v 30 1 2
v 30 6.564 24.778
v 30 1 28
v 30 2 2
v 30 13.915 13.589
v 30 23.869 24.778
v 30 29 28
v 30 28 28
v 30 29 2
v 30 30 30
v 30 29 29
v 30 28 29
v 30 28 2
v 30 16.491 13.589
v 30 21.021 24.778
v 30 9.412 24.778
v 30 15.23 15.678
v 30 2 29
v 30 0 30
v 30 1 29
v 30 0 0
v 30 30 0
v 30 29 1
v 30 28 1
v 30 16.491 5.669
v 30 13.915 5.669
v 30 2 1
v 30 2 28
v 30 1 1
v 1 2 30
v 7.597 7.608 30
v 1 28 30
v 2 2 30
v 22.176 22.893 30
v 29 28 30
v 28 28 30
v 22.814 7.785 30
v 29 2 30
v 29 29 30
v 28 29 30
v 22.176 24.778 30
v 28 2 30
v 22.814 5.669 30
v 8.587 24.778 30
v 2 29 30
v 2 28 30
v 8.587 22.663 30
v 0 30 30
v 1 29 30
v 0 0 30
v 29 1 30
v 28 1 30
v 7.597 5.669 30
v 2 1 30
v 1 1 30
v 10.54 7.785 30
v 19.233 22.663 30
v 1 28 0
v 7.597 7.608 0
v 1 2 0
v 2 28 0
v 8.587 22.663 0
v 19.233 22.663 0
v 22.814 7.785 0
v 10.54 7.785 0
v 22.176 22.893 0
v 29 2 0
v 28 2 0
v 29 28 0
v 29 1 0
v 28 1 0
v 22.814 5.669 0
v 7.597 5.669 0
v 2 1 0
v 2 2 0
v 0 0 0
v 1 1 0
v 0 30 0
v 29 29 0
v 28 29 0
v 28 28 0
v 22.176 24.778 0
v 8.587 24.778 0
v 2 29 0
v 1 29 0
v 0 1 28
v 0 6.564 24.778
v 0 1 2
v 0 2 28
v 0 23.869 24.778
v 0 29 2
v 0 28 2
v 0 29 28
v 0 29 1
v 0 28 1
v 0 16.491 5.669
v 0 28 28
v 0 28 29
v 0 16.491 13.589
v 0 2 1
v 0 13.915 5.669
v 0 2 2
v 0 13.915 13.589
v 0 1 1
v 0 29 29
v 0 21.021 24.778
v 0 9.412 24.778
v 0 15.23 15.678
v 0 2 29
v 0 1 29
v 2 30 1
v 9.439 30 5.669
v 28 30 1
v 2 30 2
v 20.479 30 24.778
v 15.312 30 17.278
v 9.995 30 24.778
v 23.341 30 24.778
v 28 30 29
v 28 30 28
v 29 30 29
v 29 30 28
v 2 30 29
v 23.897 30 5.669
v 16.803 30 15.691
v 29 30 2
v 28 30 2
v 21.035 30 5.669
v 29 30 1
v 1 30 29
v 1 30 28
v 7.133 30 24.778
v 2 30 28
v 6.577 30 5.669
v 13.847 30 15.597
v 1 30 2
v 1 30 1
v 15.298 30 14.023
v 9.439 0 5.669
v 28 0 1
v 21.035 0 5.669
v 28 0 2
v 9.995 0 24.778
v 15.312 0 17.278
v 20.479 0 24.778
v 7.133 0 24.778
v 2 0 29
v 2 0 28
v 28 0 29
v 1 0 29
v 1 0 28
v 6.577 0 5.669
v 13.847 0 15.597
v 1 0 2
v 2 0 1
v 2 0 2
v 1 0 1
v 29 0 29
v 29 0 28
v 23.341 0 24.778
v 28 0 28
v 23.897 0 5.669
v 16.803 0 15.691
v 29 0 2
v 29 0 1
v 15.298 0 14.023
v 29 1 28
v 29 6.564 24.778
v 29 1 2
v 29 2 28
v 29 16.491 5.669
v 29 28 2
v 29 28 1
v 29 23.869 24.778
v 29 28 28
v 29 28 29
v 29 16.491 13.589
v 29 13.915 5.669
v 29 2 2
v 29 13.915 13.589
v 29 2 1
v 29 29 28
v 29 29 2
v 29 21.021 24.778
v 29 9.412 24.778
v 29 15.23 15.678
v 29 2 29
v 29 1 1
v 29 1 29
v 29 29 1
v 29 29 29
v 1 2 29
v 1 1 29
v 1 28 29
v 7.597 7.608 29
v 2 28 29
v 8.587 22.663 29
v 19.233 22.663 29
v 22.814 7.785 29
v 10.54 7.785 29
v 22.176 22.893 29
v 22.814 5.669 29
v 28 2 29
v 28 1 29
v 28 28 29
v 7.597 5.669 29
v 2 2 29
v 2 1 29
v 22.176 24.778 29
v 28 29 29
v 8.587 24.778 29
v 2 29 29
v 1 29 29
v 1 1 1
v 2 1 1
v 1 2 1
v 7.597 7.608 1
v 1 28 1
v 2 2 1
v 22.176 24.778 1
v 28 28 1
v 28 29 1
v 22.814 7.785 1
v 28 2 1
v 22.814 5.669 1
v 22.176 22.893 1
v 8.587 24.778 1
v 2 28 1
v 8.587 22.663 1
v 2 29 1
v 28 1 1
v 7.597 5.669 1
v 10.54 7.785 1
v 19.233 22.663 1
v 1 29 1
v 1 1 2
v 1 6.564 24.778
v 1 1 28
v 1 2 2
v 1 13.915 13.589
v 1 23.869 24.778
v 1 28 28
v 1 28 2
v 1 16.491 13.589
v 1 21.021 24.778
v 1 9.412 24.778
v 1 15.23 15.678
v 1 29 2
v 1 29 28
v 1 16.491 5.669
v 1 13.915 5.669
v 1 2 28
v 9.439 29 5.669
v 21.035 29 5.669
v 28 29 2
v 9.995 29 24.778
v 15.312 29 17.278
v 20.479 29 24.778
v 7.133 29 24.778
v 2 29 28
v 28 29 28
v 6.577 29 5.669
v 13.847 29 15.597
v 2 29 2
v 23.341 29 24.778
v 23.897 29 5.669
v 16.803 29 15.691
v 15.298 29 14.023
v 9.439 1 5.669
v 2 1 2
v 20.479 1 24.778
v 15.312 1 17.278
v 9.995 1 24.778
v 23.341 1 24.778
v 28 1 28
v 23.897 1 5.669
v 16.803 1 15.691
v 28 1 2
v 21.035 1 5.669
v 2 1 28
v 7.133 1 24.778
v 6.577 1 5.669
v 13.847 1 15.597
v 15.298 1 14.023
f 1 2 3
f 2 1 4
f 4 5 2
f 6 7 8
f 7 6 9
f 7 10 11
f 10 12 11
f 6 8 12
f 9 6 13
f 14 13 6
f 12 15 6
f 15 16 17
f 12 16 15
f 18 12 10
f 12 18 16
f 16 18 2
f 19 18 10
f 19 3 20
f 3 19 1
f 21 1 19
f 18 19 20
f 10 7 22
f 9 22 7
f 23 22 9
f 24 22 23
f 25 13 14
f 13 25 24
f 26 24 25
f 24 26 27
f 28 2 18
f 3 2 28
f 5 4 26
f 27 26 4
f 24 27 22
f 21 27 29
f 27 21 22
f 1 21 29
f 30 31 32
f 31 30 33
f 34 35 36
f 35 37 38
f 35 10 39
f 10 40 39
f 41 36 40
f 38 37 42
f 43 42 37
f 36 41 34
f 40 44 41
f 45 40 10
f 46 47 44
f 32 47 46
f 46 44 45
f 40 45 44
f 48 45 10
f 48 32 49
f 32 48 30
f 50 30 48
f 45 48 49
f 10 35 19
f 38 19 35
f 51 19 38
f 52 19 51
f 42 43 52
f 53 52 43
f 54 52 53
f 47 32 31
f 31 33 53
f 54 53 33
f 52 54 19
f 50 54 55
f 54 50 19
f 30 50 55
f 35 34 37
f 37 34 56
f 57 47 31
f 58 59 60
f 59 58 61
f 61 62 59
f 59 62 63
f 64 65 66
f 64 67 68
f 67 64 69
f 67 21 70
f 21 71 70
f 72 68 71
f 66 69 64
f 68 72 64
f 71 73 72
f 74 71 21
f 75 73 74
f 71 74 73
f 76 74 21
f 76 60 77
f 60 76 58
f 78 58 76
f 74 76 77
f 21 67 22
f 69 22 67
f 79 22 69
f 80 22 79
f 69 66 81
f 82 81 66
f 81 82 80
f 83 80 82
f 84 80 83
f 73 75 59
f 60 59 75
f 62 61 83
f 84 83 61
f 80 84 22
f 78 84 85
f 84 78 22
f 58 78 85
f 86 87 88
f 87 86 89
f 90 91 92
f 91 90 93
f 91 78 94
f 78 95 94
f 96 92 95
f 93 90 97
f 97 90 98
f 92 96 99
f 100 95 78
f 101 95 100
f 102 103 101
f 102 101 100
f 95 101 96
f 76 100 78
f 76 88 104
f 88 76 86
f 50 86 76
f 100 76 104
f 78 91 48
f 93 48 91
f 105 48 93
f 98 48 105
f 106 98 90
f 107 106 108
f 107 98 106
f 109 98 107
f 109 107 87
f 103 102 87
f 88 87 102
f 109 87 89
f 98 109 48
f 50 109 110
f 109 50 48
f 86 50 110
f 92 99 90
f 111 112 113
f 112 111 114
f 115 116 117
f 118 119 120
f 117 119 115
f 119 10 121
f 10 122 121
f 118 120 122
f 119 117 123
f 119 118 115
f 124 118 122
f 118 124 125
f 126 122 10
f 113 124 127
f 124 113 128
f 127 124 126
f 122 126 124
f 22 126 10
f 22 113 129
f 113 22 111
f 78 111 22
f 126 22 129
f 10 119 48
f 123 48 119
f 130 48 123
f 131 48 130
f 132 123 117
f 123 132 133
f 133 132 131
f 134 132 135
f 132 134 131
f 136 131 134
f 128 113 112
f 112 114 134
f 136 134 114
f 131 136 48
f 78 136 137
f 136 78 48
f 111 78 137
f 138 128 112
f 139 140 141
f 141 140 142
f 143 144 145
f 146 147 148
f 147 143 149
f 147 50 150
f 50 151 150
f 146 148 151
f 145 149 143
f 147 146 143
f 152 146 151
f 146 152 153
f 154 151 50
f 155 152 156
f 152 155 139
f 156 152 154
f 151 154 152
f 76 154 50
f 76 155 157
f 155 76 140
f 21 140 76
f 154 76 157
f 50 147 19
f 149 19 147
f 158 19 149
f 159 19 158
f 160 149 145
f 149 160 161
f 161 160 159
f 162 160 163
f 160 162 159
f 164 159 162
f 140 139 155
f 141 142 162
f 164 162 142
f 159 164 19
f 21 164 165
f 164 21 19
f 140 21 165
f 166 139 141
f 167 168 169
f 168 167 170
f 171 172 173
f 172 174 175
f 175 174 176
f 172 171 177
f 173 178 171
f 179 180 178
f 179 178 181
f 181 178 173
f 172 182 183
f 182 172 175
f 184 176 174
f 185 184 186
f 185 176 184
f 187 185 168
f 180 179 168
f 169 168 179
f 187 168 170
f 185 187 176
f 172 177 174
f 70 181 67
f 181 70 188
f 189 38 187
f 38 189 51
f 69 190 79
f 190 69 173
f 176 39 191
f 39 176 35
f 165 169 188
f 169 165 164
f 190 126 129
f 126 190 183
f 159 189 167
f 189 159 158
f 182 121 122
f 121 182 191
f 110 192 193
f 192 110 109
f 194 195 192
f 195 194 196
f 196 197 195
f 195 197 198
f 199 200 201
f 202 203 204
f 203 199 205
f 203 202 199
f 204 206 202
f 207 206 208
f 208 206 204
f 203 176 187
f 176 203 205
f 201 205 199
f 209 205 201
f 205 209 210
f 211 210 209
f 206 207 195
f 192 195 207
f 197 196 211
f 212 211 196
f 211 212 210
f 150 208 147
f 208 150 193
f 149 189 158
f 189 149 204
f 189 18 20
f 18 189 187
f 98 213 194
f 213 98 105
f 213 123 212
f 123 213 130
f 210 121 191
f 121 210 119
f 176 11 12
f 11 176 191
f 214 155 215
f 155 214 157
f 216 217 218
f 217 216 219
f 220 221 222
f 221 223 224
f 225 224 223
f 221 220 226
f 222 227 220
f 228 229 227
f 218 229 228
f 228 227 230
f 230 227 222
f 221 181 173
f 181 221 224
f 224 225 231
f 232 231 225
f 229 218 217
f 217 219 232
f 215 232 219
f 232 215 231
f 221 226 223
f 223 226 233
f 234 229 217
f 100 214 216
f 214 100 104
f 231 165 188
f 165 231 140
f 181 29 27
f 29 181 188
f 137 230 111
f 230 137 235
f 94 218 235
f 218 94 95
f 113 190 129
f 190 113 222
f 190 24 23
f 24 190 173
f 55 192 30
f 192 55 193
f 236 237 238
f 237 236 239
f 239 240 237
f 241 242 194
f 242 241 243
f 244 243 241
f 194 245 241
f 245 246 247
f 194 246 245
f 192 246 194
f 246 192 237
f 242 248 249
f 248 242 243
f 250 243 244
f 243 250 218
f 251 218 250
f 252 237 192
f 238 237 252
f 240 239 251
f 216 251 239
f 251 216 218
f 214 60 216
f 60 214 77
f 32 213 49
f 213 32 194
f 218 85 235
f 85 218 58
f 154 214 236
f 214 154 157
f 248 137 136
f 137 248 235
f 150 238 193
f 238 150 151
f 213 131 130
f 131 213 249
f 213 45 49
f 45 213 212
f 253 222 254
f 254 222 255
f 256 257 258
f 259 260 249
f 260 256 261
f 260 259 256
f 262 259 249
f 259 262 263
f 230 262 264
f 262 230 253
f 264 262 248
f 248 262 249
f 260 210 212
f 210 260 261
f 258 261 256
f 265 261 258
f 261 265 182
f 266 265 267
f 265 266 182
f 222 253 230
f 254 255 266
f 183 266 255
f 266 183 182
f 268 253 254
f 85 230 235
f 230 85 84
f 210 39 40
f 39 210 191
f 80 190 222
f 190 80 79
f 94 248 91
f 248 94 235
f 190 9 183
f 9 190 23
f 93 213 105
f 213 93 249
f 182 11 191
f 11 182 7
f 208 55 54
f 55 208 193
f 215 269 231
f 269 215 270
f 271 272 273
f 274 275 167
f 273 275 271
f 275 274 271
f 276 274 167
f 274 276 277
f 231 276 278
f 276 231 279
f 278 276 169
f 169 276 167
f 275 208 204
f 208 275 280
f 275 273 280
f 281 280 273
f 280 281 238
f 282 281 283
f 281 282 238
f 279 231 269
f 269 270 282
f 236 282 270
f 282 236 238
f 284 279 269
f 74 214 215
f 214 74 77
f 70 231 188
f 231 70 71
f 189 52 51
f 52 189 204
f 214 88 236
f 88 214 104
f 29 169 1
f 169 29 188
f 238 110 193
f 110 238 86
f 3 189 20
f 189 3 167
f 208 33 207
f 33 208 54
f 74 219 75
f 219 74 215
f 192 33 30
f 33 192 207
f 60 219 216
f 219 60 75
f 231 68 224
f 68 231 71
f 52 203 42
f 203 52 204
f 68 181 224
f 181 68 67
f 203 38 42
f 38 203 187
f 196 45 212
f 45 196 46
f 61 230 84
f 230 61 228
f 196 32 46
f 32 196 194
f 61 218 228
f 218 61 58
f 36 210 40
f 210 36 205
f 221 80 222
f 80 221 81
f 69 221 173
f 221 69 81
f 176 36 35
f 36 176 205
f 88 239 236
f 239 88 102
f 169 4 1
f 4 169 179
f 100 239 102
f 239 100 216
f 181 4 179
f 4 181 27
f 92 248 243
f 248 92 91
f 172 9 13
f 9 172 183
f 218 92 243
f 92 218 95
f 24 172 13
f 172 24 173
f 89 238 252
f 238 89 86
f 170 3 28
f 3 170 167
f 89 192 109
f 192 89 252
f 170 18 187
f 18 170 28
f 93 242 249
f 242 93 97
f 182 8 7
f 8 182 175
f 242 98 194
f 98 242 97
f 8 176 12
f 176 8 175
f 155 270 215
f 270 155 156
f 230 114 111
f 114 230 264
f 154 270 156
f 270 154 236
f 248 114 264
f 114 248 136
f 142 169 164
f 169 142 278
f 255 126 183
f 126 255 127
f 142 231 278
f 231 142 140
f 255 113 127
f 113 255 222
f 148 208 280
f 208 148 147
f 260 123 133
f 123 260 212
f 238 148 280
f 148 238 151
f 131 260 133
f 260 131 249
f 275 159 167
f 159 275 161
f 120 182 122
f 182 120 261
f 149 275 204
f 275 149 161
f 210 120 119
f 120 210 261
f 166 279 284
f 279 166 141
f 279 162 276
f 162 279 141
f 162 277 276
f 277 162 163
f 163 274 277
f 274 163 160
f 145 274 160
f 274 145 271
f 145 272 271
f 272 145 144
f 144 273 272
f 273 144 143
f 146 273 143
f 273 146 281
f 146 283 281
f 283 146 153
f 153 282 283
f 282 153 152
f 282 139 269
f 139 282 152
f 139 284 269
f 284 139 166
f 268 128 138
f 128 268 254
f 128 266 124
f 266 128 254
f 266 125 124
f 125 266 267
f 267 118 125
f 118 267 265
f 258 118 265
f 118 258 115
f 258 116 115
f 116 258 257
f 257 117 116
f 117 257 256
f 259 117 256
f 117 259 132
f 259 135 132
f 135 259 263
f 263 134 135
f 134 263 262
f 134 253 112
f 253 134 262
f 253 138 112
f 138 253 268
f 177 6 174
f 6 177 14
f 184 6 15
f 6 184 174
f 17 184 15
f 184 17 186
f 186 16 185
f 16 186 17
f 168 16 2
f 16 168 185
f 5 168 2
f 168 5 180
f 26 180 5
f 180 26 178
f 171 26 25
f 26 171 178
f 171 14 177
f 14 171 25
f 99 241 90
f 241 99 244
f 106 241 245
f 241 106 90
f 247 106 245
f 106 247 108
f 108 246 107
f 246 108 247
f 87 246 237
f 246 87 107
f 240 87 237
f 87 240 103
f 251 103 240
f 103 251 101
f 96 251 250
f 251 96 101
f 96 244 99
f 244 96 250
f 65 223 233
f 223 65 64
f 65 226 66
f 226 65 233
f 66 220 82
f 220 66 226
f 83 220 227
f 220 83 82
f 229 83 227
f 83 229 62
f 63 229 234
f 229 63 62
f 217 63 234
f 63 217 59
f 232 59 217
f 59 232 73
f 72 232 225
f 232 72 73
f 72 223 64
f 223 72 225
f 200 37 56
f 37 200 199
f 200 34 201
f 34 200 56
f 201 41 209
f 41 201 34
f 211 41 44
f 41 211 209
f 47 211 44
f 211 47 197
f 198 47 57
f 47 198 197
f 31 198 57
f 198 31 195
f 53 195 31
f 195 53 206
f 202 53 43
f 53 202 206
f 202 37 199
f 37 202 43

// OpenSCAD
Cube_Size = 30;
Cube_Thickness = 1;
Drainage_Hole = 1;

X_Letter_Comp = 0.01 * Cube_Size;
Y_Letter_Comp = 0.01 * Cube_Size;
Z_Letter_Comp = 0.015 * Cube_Size;

$fn = 128;
f = 0.01;
df = 2* f;



module hollow_cube() {
    difference() {
        cube(Cube_Size);
        translate([Cube_Thickness, Cube_Thickness, Cube_Thickness])
            cube(Cube_Size - 2 * Cube_Thickness);
        translate([Cube_Thickness, Cube_Thickness, -f])
            cube([Drainage_Hole, Drainage_Hole, Cube_Size + df]);
        translate([Cube_Size - Cube_Thickness - Drainage_Hole, Cube_Thickness, -f])     
            cube([Drainage_Hole, Drainage_Hole, Cube_Size + df]);        
        translate([Cube_Thickness, Cube_Size - Cube_Thickness - Drainage_Hole, -f])
            cube([Drainage_Hole, Drainage_Hole, Cube_Size + df]);                
        translate([Cube_Size - Cube_Thickness - Drainage_Hole, Cube_Size - Cube_Thickness - Drainage_Hole, -f])
            cube([Drainage_Hole, Drainage_Hole, Cube_Size + df]);
        
        translate([-f, Cube_Thickness, Cube_Thickness])
            cube([Cube_Size + df, Drainage_Hole, Drainage_Hole]);
        translate([-f, Cube_Size - Cube_Thickness - Drainage_Hole, Cube_Thickness])
            cube([Cube_Size + df, Drainage_Hole, Drainage_Hole]);
        translate([-f, Cube_Thickness, Cube_Size - Cube_Thickness - Drainage_Hole])
            cube([Cube_Size + df, Drainage_Hole, Drainage_Hole]);
        translate([-f, Cube_Size - Cube_Thickness - Drainage_Hole, Cube_Size - Cube_Thickness - Drainage_Hole])
            cube([Cube_Size + df, Drainage_Hole, Drainage_Hole]);

        
        translate([Cube_Thickness, -f, Cube_Thickness])
            cube([Drainage_Hole, Cube_Size + df, Drainage_Hole]);
        translate([Cube_Size - Cube_Thickness - Drainage_Hole, -f, Cube_Thickness])
            cube([Drainage_Hole, Cube_Size + df, Drainage_Hole]);
        translate([Cube_Thickness, -f, Cube_Size - Cube_Thickness - Drainage_Hole])
            cube([Drainage_Hole, Cube_Size + df, Drainage_Hole]);
        translate([Cube_Size - Cube_Thickness - Drainage_Hole, -f, Cube_Size - Cube_Thickness - Drainage_Hole])
            cube([Drainage_Hole, Cube_Size + df, Drainage_Hole]);
    }
}

module lettered_cube() {
    difference() {
        hollow_cube();
        translate([Cube_Size/2, Cube_Thickness*2, Cube_Size/2])
            rotate([90, 0 ,0])
                linear_extrude(height = Cube_Thickness * 3) 
                    text("X", size=20, font = "Arial:style=Black", halign="center", valign="center");
        translate([Cube_Size/2, Cube_Size + Cube_Thickness, Cube_Size/2])
            rotate([90, 0 ,0])
                linear_extrude(height = Cube_Thickness * 3) 
                    text("X", size=20, font = "Arial:style=Black", halign="center", valign="center");
        translate([Cube_Size-Cube_Thickness*2, Cube_Size/2, Cube_Size/2])
            rotate([90, 0, 90])
                linear_extrude(height = Cube_Thickness * 3) 
                    text("Y", size=20, font = "Arial:style=Black", halign="center", valign="center");
        translate([-Cube_Thickness, Cube_Size/2, Cube_Size/2])
            rotate([90, 0, 90])
                linear_extrude(height = Cube_Thickness * 3) 
                    text("Y", size=20, font = "Arial:style=Black", halign="center", valign="center");
        translate([Cube_Size/2, Cube_Size/2, -Cube_Thickness])
            rotate([0, 0, 0])
                linear_extrude(height = Cube_Thickness * 3) 
                    text("Z", size=20, font = "Arial:style=Black", halign="center", valign="center");
        translate([Cube_Size/2, Cube_Size/2, Cube_Size-Cube_Thickness*2])
            rotate([0, 0, 0])
                linear_extrude(height = Cube_Thickness * 3) 
                    text("Z", size=20, font = "Arial:style=Black", halign="center", valign="center");
    }

//    // X-Support
//    translate([Cube_Size/2 - Cube_Thickness/2 + X_Letter_Comp, Cube_Thickness, 0])
//        cube([Cube_Thickness, Cube_Thickness, Cube_Size]);
//    translate([Cube_Size/2 - Cube_Thickness/2 + X_Letter_Comp, Cube_Size - 2 * Cube_Thickness, 0])
//        cube([Cube_Thickness, Cube_Thickness, Cube_Size]);
//
//    
//    // Y-Support
//    translate([Cube_Thickness, Cube_Size/2 - Cube_Thickness/2 + Y_Letter_Comp, 0])
//        cube([Cube_Thickness, Cube_Thickness, Cube_Size]);
//    translate([Cube_Size - 2 * Cube_Thickness, Cube_Size/2 - Cube_Thickness/2 + Y_Letter_Comp, 0])
//        cube([Cube_Thickness, Cube_Thickness, Cube_Size]);
//    
//    // Z-Support
//    translate([0, Cube_Size/3 - Z_Letter_Comp, Cube_Thickness])
//        cube([Cube_Size, Cube_Thickness, Cube_Thickness]);
//    translate([0, Cube_Size/3 * 2 - Z_Letter_Comp/4, Cube_Thickness])
//        cube([Cube_Size, Cube_Thickness, Cube_Thickness]);
//    translate([0, Cube_Size/3 - Z_Letter_Comp, Cube_Size - Cube_Thickness * 2])
//        cube([Cube_Size, Cube_Thickness, Cube_Thickness]);
//    translate([0, Cube_Size/3 * 2 - Z_Letter_Comp/4, Cube_Size - Cube_Thickness * 2])
//        cube([Cube_Size, Cube_Thickness, Cube_Thickness]);    
    
    
}


lettered_cube();
